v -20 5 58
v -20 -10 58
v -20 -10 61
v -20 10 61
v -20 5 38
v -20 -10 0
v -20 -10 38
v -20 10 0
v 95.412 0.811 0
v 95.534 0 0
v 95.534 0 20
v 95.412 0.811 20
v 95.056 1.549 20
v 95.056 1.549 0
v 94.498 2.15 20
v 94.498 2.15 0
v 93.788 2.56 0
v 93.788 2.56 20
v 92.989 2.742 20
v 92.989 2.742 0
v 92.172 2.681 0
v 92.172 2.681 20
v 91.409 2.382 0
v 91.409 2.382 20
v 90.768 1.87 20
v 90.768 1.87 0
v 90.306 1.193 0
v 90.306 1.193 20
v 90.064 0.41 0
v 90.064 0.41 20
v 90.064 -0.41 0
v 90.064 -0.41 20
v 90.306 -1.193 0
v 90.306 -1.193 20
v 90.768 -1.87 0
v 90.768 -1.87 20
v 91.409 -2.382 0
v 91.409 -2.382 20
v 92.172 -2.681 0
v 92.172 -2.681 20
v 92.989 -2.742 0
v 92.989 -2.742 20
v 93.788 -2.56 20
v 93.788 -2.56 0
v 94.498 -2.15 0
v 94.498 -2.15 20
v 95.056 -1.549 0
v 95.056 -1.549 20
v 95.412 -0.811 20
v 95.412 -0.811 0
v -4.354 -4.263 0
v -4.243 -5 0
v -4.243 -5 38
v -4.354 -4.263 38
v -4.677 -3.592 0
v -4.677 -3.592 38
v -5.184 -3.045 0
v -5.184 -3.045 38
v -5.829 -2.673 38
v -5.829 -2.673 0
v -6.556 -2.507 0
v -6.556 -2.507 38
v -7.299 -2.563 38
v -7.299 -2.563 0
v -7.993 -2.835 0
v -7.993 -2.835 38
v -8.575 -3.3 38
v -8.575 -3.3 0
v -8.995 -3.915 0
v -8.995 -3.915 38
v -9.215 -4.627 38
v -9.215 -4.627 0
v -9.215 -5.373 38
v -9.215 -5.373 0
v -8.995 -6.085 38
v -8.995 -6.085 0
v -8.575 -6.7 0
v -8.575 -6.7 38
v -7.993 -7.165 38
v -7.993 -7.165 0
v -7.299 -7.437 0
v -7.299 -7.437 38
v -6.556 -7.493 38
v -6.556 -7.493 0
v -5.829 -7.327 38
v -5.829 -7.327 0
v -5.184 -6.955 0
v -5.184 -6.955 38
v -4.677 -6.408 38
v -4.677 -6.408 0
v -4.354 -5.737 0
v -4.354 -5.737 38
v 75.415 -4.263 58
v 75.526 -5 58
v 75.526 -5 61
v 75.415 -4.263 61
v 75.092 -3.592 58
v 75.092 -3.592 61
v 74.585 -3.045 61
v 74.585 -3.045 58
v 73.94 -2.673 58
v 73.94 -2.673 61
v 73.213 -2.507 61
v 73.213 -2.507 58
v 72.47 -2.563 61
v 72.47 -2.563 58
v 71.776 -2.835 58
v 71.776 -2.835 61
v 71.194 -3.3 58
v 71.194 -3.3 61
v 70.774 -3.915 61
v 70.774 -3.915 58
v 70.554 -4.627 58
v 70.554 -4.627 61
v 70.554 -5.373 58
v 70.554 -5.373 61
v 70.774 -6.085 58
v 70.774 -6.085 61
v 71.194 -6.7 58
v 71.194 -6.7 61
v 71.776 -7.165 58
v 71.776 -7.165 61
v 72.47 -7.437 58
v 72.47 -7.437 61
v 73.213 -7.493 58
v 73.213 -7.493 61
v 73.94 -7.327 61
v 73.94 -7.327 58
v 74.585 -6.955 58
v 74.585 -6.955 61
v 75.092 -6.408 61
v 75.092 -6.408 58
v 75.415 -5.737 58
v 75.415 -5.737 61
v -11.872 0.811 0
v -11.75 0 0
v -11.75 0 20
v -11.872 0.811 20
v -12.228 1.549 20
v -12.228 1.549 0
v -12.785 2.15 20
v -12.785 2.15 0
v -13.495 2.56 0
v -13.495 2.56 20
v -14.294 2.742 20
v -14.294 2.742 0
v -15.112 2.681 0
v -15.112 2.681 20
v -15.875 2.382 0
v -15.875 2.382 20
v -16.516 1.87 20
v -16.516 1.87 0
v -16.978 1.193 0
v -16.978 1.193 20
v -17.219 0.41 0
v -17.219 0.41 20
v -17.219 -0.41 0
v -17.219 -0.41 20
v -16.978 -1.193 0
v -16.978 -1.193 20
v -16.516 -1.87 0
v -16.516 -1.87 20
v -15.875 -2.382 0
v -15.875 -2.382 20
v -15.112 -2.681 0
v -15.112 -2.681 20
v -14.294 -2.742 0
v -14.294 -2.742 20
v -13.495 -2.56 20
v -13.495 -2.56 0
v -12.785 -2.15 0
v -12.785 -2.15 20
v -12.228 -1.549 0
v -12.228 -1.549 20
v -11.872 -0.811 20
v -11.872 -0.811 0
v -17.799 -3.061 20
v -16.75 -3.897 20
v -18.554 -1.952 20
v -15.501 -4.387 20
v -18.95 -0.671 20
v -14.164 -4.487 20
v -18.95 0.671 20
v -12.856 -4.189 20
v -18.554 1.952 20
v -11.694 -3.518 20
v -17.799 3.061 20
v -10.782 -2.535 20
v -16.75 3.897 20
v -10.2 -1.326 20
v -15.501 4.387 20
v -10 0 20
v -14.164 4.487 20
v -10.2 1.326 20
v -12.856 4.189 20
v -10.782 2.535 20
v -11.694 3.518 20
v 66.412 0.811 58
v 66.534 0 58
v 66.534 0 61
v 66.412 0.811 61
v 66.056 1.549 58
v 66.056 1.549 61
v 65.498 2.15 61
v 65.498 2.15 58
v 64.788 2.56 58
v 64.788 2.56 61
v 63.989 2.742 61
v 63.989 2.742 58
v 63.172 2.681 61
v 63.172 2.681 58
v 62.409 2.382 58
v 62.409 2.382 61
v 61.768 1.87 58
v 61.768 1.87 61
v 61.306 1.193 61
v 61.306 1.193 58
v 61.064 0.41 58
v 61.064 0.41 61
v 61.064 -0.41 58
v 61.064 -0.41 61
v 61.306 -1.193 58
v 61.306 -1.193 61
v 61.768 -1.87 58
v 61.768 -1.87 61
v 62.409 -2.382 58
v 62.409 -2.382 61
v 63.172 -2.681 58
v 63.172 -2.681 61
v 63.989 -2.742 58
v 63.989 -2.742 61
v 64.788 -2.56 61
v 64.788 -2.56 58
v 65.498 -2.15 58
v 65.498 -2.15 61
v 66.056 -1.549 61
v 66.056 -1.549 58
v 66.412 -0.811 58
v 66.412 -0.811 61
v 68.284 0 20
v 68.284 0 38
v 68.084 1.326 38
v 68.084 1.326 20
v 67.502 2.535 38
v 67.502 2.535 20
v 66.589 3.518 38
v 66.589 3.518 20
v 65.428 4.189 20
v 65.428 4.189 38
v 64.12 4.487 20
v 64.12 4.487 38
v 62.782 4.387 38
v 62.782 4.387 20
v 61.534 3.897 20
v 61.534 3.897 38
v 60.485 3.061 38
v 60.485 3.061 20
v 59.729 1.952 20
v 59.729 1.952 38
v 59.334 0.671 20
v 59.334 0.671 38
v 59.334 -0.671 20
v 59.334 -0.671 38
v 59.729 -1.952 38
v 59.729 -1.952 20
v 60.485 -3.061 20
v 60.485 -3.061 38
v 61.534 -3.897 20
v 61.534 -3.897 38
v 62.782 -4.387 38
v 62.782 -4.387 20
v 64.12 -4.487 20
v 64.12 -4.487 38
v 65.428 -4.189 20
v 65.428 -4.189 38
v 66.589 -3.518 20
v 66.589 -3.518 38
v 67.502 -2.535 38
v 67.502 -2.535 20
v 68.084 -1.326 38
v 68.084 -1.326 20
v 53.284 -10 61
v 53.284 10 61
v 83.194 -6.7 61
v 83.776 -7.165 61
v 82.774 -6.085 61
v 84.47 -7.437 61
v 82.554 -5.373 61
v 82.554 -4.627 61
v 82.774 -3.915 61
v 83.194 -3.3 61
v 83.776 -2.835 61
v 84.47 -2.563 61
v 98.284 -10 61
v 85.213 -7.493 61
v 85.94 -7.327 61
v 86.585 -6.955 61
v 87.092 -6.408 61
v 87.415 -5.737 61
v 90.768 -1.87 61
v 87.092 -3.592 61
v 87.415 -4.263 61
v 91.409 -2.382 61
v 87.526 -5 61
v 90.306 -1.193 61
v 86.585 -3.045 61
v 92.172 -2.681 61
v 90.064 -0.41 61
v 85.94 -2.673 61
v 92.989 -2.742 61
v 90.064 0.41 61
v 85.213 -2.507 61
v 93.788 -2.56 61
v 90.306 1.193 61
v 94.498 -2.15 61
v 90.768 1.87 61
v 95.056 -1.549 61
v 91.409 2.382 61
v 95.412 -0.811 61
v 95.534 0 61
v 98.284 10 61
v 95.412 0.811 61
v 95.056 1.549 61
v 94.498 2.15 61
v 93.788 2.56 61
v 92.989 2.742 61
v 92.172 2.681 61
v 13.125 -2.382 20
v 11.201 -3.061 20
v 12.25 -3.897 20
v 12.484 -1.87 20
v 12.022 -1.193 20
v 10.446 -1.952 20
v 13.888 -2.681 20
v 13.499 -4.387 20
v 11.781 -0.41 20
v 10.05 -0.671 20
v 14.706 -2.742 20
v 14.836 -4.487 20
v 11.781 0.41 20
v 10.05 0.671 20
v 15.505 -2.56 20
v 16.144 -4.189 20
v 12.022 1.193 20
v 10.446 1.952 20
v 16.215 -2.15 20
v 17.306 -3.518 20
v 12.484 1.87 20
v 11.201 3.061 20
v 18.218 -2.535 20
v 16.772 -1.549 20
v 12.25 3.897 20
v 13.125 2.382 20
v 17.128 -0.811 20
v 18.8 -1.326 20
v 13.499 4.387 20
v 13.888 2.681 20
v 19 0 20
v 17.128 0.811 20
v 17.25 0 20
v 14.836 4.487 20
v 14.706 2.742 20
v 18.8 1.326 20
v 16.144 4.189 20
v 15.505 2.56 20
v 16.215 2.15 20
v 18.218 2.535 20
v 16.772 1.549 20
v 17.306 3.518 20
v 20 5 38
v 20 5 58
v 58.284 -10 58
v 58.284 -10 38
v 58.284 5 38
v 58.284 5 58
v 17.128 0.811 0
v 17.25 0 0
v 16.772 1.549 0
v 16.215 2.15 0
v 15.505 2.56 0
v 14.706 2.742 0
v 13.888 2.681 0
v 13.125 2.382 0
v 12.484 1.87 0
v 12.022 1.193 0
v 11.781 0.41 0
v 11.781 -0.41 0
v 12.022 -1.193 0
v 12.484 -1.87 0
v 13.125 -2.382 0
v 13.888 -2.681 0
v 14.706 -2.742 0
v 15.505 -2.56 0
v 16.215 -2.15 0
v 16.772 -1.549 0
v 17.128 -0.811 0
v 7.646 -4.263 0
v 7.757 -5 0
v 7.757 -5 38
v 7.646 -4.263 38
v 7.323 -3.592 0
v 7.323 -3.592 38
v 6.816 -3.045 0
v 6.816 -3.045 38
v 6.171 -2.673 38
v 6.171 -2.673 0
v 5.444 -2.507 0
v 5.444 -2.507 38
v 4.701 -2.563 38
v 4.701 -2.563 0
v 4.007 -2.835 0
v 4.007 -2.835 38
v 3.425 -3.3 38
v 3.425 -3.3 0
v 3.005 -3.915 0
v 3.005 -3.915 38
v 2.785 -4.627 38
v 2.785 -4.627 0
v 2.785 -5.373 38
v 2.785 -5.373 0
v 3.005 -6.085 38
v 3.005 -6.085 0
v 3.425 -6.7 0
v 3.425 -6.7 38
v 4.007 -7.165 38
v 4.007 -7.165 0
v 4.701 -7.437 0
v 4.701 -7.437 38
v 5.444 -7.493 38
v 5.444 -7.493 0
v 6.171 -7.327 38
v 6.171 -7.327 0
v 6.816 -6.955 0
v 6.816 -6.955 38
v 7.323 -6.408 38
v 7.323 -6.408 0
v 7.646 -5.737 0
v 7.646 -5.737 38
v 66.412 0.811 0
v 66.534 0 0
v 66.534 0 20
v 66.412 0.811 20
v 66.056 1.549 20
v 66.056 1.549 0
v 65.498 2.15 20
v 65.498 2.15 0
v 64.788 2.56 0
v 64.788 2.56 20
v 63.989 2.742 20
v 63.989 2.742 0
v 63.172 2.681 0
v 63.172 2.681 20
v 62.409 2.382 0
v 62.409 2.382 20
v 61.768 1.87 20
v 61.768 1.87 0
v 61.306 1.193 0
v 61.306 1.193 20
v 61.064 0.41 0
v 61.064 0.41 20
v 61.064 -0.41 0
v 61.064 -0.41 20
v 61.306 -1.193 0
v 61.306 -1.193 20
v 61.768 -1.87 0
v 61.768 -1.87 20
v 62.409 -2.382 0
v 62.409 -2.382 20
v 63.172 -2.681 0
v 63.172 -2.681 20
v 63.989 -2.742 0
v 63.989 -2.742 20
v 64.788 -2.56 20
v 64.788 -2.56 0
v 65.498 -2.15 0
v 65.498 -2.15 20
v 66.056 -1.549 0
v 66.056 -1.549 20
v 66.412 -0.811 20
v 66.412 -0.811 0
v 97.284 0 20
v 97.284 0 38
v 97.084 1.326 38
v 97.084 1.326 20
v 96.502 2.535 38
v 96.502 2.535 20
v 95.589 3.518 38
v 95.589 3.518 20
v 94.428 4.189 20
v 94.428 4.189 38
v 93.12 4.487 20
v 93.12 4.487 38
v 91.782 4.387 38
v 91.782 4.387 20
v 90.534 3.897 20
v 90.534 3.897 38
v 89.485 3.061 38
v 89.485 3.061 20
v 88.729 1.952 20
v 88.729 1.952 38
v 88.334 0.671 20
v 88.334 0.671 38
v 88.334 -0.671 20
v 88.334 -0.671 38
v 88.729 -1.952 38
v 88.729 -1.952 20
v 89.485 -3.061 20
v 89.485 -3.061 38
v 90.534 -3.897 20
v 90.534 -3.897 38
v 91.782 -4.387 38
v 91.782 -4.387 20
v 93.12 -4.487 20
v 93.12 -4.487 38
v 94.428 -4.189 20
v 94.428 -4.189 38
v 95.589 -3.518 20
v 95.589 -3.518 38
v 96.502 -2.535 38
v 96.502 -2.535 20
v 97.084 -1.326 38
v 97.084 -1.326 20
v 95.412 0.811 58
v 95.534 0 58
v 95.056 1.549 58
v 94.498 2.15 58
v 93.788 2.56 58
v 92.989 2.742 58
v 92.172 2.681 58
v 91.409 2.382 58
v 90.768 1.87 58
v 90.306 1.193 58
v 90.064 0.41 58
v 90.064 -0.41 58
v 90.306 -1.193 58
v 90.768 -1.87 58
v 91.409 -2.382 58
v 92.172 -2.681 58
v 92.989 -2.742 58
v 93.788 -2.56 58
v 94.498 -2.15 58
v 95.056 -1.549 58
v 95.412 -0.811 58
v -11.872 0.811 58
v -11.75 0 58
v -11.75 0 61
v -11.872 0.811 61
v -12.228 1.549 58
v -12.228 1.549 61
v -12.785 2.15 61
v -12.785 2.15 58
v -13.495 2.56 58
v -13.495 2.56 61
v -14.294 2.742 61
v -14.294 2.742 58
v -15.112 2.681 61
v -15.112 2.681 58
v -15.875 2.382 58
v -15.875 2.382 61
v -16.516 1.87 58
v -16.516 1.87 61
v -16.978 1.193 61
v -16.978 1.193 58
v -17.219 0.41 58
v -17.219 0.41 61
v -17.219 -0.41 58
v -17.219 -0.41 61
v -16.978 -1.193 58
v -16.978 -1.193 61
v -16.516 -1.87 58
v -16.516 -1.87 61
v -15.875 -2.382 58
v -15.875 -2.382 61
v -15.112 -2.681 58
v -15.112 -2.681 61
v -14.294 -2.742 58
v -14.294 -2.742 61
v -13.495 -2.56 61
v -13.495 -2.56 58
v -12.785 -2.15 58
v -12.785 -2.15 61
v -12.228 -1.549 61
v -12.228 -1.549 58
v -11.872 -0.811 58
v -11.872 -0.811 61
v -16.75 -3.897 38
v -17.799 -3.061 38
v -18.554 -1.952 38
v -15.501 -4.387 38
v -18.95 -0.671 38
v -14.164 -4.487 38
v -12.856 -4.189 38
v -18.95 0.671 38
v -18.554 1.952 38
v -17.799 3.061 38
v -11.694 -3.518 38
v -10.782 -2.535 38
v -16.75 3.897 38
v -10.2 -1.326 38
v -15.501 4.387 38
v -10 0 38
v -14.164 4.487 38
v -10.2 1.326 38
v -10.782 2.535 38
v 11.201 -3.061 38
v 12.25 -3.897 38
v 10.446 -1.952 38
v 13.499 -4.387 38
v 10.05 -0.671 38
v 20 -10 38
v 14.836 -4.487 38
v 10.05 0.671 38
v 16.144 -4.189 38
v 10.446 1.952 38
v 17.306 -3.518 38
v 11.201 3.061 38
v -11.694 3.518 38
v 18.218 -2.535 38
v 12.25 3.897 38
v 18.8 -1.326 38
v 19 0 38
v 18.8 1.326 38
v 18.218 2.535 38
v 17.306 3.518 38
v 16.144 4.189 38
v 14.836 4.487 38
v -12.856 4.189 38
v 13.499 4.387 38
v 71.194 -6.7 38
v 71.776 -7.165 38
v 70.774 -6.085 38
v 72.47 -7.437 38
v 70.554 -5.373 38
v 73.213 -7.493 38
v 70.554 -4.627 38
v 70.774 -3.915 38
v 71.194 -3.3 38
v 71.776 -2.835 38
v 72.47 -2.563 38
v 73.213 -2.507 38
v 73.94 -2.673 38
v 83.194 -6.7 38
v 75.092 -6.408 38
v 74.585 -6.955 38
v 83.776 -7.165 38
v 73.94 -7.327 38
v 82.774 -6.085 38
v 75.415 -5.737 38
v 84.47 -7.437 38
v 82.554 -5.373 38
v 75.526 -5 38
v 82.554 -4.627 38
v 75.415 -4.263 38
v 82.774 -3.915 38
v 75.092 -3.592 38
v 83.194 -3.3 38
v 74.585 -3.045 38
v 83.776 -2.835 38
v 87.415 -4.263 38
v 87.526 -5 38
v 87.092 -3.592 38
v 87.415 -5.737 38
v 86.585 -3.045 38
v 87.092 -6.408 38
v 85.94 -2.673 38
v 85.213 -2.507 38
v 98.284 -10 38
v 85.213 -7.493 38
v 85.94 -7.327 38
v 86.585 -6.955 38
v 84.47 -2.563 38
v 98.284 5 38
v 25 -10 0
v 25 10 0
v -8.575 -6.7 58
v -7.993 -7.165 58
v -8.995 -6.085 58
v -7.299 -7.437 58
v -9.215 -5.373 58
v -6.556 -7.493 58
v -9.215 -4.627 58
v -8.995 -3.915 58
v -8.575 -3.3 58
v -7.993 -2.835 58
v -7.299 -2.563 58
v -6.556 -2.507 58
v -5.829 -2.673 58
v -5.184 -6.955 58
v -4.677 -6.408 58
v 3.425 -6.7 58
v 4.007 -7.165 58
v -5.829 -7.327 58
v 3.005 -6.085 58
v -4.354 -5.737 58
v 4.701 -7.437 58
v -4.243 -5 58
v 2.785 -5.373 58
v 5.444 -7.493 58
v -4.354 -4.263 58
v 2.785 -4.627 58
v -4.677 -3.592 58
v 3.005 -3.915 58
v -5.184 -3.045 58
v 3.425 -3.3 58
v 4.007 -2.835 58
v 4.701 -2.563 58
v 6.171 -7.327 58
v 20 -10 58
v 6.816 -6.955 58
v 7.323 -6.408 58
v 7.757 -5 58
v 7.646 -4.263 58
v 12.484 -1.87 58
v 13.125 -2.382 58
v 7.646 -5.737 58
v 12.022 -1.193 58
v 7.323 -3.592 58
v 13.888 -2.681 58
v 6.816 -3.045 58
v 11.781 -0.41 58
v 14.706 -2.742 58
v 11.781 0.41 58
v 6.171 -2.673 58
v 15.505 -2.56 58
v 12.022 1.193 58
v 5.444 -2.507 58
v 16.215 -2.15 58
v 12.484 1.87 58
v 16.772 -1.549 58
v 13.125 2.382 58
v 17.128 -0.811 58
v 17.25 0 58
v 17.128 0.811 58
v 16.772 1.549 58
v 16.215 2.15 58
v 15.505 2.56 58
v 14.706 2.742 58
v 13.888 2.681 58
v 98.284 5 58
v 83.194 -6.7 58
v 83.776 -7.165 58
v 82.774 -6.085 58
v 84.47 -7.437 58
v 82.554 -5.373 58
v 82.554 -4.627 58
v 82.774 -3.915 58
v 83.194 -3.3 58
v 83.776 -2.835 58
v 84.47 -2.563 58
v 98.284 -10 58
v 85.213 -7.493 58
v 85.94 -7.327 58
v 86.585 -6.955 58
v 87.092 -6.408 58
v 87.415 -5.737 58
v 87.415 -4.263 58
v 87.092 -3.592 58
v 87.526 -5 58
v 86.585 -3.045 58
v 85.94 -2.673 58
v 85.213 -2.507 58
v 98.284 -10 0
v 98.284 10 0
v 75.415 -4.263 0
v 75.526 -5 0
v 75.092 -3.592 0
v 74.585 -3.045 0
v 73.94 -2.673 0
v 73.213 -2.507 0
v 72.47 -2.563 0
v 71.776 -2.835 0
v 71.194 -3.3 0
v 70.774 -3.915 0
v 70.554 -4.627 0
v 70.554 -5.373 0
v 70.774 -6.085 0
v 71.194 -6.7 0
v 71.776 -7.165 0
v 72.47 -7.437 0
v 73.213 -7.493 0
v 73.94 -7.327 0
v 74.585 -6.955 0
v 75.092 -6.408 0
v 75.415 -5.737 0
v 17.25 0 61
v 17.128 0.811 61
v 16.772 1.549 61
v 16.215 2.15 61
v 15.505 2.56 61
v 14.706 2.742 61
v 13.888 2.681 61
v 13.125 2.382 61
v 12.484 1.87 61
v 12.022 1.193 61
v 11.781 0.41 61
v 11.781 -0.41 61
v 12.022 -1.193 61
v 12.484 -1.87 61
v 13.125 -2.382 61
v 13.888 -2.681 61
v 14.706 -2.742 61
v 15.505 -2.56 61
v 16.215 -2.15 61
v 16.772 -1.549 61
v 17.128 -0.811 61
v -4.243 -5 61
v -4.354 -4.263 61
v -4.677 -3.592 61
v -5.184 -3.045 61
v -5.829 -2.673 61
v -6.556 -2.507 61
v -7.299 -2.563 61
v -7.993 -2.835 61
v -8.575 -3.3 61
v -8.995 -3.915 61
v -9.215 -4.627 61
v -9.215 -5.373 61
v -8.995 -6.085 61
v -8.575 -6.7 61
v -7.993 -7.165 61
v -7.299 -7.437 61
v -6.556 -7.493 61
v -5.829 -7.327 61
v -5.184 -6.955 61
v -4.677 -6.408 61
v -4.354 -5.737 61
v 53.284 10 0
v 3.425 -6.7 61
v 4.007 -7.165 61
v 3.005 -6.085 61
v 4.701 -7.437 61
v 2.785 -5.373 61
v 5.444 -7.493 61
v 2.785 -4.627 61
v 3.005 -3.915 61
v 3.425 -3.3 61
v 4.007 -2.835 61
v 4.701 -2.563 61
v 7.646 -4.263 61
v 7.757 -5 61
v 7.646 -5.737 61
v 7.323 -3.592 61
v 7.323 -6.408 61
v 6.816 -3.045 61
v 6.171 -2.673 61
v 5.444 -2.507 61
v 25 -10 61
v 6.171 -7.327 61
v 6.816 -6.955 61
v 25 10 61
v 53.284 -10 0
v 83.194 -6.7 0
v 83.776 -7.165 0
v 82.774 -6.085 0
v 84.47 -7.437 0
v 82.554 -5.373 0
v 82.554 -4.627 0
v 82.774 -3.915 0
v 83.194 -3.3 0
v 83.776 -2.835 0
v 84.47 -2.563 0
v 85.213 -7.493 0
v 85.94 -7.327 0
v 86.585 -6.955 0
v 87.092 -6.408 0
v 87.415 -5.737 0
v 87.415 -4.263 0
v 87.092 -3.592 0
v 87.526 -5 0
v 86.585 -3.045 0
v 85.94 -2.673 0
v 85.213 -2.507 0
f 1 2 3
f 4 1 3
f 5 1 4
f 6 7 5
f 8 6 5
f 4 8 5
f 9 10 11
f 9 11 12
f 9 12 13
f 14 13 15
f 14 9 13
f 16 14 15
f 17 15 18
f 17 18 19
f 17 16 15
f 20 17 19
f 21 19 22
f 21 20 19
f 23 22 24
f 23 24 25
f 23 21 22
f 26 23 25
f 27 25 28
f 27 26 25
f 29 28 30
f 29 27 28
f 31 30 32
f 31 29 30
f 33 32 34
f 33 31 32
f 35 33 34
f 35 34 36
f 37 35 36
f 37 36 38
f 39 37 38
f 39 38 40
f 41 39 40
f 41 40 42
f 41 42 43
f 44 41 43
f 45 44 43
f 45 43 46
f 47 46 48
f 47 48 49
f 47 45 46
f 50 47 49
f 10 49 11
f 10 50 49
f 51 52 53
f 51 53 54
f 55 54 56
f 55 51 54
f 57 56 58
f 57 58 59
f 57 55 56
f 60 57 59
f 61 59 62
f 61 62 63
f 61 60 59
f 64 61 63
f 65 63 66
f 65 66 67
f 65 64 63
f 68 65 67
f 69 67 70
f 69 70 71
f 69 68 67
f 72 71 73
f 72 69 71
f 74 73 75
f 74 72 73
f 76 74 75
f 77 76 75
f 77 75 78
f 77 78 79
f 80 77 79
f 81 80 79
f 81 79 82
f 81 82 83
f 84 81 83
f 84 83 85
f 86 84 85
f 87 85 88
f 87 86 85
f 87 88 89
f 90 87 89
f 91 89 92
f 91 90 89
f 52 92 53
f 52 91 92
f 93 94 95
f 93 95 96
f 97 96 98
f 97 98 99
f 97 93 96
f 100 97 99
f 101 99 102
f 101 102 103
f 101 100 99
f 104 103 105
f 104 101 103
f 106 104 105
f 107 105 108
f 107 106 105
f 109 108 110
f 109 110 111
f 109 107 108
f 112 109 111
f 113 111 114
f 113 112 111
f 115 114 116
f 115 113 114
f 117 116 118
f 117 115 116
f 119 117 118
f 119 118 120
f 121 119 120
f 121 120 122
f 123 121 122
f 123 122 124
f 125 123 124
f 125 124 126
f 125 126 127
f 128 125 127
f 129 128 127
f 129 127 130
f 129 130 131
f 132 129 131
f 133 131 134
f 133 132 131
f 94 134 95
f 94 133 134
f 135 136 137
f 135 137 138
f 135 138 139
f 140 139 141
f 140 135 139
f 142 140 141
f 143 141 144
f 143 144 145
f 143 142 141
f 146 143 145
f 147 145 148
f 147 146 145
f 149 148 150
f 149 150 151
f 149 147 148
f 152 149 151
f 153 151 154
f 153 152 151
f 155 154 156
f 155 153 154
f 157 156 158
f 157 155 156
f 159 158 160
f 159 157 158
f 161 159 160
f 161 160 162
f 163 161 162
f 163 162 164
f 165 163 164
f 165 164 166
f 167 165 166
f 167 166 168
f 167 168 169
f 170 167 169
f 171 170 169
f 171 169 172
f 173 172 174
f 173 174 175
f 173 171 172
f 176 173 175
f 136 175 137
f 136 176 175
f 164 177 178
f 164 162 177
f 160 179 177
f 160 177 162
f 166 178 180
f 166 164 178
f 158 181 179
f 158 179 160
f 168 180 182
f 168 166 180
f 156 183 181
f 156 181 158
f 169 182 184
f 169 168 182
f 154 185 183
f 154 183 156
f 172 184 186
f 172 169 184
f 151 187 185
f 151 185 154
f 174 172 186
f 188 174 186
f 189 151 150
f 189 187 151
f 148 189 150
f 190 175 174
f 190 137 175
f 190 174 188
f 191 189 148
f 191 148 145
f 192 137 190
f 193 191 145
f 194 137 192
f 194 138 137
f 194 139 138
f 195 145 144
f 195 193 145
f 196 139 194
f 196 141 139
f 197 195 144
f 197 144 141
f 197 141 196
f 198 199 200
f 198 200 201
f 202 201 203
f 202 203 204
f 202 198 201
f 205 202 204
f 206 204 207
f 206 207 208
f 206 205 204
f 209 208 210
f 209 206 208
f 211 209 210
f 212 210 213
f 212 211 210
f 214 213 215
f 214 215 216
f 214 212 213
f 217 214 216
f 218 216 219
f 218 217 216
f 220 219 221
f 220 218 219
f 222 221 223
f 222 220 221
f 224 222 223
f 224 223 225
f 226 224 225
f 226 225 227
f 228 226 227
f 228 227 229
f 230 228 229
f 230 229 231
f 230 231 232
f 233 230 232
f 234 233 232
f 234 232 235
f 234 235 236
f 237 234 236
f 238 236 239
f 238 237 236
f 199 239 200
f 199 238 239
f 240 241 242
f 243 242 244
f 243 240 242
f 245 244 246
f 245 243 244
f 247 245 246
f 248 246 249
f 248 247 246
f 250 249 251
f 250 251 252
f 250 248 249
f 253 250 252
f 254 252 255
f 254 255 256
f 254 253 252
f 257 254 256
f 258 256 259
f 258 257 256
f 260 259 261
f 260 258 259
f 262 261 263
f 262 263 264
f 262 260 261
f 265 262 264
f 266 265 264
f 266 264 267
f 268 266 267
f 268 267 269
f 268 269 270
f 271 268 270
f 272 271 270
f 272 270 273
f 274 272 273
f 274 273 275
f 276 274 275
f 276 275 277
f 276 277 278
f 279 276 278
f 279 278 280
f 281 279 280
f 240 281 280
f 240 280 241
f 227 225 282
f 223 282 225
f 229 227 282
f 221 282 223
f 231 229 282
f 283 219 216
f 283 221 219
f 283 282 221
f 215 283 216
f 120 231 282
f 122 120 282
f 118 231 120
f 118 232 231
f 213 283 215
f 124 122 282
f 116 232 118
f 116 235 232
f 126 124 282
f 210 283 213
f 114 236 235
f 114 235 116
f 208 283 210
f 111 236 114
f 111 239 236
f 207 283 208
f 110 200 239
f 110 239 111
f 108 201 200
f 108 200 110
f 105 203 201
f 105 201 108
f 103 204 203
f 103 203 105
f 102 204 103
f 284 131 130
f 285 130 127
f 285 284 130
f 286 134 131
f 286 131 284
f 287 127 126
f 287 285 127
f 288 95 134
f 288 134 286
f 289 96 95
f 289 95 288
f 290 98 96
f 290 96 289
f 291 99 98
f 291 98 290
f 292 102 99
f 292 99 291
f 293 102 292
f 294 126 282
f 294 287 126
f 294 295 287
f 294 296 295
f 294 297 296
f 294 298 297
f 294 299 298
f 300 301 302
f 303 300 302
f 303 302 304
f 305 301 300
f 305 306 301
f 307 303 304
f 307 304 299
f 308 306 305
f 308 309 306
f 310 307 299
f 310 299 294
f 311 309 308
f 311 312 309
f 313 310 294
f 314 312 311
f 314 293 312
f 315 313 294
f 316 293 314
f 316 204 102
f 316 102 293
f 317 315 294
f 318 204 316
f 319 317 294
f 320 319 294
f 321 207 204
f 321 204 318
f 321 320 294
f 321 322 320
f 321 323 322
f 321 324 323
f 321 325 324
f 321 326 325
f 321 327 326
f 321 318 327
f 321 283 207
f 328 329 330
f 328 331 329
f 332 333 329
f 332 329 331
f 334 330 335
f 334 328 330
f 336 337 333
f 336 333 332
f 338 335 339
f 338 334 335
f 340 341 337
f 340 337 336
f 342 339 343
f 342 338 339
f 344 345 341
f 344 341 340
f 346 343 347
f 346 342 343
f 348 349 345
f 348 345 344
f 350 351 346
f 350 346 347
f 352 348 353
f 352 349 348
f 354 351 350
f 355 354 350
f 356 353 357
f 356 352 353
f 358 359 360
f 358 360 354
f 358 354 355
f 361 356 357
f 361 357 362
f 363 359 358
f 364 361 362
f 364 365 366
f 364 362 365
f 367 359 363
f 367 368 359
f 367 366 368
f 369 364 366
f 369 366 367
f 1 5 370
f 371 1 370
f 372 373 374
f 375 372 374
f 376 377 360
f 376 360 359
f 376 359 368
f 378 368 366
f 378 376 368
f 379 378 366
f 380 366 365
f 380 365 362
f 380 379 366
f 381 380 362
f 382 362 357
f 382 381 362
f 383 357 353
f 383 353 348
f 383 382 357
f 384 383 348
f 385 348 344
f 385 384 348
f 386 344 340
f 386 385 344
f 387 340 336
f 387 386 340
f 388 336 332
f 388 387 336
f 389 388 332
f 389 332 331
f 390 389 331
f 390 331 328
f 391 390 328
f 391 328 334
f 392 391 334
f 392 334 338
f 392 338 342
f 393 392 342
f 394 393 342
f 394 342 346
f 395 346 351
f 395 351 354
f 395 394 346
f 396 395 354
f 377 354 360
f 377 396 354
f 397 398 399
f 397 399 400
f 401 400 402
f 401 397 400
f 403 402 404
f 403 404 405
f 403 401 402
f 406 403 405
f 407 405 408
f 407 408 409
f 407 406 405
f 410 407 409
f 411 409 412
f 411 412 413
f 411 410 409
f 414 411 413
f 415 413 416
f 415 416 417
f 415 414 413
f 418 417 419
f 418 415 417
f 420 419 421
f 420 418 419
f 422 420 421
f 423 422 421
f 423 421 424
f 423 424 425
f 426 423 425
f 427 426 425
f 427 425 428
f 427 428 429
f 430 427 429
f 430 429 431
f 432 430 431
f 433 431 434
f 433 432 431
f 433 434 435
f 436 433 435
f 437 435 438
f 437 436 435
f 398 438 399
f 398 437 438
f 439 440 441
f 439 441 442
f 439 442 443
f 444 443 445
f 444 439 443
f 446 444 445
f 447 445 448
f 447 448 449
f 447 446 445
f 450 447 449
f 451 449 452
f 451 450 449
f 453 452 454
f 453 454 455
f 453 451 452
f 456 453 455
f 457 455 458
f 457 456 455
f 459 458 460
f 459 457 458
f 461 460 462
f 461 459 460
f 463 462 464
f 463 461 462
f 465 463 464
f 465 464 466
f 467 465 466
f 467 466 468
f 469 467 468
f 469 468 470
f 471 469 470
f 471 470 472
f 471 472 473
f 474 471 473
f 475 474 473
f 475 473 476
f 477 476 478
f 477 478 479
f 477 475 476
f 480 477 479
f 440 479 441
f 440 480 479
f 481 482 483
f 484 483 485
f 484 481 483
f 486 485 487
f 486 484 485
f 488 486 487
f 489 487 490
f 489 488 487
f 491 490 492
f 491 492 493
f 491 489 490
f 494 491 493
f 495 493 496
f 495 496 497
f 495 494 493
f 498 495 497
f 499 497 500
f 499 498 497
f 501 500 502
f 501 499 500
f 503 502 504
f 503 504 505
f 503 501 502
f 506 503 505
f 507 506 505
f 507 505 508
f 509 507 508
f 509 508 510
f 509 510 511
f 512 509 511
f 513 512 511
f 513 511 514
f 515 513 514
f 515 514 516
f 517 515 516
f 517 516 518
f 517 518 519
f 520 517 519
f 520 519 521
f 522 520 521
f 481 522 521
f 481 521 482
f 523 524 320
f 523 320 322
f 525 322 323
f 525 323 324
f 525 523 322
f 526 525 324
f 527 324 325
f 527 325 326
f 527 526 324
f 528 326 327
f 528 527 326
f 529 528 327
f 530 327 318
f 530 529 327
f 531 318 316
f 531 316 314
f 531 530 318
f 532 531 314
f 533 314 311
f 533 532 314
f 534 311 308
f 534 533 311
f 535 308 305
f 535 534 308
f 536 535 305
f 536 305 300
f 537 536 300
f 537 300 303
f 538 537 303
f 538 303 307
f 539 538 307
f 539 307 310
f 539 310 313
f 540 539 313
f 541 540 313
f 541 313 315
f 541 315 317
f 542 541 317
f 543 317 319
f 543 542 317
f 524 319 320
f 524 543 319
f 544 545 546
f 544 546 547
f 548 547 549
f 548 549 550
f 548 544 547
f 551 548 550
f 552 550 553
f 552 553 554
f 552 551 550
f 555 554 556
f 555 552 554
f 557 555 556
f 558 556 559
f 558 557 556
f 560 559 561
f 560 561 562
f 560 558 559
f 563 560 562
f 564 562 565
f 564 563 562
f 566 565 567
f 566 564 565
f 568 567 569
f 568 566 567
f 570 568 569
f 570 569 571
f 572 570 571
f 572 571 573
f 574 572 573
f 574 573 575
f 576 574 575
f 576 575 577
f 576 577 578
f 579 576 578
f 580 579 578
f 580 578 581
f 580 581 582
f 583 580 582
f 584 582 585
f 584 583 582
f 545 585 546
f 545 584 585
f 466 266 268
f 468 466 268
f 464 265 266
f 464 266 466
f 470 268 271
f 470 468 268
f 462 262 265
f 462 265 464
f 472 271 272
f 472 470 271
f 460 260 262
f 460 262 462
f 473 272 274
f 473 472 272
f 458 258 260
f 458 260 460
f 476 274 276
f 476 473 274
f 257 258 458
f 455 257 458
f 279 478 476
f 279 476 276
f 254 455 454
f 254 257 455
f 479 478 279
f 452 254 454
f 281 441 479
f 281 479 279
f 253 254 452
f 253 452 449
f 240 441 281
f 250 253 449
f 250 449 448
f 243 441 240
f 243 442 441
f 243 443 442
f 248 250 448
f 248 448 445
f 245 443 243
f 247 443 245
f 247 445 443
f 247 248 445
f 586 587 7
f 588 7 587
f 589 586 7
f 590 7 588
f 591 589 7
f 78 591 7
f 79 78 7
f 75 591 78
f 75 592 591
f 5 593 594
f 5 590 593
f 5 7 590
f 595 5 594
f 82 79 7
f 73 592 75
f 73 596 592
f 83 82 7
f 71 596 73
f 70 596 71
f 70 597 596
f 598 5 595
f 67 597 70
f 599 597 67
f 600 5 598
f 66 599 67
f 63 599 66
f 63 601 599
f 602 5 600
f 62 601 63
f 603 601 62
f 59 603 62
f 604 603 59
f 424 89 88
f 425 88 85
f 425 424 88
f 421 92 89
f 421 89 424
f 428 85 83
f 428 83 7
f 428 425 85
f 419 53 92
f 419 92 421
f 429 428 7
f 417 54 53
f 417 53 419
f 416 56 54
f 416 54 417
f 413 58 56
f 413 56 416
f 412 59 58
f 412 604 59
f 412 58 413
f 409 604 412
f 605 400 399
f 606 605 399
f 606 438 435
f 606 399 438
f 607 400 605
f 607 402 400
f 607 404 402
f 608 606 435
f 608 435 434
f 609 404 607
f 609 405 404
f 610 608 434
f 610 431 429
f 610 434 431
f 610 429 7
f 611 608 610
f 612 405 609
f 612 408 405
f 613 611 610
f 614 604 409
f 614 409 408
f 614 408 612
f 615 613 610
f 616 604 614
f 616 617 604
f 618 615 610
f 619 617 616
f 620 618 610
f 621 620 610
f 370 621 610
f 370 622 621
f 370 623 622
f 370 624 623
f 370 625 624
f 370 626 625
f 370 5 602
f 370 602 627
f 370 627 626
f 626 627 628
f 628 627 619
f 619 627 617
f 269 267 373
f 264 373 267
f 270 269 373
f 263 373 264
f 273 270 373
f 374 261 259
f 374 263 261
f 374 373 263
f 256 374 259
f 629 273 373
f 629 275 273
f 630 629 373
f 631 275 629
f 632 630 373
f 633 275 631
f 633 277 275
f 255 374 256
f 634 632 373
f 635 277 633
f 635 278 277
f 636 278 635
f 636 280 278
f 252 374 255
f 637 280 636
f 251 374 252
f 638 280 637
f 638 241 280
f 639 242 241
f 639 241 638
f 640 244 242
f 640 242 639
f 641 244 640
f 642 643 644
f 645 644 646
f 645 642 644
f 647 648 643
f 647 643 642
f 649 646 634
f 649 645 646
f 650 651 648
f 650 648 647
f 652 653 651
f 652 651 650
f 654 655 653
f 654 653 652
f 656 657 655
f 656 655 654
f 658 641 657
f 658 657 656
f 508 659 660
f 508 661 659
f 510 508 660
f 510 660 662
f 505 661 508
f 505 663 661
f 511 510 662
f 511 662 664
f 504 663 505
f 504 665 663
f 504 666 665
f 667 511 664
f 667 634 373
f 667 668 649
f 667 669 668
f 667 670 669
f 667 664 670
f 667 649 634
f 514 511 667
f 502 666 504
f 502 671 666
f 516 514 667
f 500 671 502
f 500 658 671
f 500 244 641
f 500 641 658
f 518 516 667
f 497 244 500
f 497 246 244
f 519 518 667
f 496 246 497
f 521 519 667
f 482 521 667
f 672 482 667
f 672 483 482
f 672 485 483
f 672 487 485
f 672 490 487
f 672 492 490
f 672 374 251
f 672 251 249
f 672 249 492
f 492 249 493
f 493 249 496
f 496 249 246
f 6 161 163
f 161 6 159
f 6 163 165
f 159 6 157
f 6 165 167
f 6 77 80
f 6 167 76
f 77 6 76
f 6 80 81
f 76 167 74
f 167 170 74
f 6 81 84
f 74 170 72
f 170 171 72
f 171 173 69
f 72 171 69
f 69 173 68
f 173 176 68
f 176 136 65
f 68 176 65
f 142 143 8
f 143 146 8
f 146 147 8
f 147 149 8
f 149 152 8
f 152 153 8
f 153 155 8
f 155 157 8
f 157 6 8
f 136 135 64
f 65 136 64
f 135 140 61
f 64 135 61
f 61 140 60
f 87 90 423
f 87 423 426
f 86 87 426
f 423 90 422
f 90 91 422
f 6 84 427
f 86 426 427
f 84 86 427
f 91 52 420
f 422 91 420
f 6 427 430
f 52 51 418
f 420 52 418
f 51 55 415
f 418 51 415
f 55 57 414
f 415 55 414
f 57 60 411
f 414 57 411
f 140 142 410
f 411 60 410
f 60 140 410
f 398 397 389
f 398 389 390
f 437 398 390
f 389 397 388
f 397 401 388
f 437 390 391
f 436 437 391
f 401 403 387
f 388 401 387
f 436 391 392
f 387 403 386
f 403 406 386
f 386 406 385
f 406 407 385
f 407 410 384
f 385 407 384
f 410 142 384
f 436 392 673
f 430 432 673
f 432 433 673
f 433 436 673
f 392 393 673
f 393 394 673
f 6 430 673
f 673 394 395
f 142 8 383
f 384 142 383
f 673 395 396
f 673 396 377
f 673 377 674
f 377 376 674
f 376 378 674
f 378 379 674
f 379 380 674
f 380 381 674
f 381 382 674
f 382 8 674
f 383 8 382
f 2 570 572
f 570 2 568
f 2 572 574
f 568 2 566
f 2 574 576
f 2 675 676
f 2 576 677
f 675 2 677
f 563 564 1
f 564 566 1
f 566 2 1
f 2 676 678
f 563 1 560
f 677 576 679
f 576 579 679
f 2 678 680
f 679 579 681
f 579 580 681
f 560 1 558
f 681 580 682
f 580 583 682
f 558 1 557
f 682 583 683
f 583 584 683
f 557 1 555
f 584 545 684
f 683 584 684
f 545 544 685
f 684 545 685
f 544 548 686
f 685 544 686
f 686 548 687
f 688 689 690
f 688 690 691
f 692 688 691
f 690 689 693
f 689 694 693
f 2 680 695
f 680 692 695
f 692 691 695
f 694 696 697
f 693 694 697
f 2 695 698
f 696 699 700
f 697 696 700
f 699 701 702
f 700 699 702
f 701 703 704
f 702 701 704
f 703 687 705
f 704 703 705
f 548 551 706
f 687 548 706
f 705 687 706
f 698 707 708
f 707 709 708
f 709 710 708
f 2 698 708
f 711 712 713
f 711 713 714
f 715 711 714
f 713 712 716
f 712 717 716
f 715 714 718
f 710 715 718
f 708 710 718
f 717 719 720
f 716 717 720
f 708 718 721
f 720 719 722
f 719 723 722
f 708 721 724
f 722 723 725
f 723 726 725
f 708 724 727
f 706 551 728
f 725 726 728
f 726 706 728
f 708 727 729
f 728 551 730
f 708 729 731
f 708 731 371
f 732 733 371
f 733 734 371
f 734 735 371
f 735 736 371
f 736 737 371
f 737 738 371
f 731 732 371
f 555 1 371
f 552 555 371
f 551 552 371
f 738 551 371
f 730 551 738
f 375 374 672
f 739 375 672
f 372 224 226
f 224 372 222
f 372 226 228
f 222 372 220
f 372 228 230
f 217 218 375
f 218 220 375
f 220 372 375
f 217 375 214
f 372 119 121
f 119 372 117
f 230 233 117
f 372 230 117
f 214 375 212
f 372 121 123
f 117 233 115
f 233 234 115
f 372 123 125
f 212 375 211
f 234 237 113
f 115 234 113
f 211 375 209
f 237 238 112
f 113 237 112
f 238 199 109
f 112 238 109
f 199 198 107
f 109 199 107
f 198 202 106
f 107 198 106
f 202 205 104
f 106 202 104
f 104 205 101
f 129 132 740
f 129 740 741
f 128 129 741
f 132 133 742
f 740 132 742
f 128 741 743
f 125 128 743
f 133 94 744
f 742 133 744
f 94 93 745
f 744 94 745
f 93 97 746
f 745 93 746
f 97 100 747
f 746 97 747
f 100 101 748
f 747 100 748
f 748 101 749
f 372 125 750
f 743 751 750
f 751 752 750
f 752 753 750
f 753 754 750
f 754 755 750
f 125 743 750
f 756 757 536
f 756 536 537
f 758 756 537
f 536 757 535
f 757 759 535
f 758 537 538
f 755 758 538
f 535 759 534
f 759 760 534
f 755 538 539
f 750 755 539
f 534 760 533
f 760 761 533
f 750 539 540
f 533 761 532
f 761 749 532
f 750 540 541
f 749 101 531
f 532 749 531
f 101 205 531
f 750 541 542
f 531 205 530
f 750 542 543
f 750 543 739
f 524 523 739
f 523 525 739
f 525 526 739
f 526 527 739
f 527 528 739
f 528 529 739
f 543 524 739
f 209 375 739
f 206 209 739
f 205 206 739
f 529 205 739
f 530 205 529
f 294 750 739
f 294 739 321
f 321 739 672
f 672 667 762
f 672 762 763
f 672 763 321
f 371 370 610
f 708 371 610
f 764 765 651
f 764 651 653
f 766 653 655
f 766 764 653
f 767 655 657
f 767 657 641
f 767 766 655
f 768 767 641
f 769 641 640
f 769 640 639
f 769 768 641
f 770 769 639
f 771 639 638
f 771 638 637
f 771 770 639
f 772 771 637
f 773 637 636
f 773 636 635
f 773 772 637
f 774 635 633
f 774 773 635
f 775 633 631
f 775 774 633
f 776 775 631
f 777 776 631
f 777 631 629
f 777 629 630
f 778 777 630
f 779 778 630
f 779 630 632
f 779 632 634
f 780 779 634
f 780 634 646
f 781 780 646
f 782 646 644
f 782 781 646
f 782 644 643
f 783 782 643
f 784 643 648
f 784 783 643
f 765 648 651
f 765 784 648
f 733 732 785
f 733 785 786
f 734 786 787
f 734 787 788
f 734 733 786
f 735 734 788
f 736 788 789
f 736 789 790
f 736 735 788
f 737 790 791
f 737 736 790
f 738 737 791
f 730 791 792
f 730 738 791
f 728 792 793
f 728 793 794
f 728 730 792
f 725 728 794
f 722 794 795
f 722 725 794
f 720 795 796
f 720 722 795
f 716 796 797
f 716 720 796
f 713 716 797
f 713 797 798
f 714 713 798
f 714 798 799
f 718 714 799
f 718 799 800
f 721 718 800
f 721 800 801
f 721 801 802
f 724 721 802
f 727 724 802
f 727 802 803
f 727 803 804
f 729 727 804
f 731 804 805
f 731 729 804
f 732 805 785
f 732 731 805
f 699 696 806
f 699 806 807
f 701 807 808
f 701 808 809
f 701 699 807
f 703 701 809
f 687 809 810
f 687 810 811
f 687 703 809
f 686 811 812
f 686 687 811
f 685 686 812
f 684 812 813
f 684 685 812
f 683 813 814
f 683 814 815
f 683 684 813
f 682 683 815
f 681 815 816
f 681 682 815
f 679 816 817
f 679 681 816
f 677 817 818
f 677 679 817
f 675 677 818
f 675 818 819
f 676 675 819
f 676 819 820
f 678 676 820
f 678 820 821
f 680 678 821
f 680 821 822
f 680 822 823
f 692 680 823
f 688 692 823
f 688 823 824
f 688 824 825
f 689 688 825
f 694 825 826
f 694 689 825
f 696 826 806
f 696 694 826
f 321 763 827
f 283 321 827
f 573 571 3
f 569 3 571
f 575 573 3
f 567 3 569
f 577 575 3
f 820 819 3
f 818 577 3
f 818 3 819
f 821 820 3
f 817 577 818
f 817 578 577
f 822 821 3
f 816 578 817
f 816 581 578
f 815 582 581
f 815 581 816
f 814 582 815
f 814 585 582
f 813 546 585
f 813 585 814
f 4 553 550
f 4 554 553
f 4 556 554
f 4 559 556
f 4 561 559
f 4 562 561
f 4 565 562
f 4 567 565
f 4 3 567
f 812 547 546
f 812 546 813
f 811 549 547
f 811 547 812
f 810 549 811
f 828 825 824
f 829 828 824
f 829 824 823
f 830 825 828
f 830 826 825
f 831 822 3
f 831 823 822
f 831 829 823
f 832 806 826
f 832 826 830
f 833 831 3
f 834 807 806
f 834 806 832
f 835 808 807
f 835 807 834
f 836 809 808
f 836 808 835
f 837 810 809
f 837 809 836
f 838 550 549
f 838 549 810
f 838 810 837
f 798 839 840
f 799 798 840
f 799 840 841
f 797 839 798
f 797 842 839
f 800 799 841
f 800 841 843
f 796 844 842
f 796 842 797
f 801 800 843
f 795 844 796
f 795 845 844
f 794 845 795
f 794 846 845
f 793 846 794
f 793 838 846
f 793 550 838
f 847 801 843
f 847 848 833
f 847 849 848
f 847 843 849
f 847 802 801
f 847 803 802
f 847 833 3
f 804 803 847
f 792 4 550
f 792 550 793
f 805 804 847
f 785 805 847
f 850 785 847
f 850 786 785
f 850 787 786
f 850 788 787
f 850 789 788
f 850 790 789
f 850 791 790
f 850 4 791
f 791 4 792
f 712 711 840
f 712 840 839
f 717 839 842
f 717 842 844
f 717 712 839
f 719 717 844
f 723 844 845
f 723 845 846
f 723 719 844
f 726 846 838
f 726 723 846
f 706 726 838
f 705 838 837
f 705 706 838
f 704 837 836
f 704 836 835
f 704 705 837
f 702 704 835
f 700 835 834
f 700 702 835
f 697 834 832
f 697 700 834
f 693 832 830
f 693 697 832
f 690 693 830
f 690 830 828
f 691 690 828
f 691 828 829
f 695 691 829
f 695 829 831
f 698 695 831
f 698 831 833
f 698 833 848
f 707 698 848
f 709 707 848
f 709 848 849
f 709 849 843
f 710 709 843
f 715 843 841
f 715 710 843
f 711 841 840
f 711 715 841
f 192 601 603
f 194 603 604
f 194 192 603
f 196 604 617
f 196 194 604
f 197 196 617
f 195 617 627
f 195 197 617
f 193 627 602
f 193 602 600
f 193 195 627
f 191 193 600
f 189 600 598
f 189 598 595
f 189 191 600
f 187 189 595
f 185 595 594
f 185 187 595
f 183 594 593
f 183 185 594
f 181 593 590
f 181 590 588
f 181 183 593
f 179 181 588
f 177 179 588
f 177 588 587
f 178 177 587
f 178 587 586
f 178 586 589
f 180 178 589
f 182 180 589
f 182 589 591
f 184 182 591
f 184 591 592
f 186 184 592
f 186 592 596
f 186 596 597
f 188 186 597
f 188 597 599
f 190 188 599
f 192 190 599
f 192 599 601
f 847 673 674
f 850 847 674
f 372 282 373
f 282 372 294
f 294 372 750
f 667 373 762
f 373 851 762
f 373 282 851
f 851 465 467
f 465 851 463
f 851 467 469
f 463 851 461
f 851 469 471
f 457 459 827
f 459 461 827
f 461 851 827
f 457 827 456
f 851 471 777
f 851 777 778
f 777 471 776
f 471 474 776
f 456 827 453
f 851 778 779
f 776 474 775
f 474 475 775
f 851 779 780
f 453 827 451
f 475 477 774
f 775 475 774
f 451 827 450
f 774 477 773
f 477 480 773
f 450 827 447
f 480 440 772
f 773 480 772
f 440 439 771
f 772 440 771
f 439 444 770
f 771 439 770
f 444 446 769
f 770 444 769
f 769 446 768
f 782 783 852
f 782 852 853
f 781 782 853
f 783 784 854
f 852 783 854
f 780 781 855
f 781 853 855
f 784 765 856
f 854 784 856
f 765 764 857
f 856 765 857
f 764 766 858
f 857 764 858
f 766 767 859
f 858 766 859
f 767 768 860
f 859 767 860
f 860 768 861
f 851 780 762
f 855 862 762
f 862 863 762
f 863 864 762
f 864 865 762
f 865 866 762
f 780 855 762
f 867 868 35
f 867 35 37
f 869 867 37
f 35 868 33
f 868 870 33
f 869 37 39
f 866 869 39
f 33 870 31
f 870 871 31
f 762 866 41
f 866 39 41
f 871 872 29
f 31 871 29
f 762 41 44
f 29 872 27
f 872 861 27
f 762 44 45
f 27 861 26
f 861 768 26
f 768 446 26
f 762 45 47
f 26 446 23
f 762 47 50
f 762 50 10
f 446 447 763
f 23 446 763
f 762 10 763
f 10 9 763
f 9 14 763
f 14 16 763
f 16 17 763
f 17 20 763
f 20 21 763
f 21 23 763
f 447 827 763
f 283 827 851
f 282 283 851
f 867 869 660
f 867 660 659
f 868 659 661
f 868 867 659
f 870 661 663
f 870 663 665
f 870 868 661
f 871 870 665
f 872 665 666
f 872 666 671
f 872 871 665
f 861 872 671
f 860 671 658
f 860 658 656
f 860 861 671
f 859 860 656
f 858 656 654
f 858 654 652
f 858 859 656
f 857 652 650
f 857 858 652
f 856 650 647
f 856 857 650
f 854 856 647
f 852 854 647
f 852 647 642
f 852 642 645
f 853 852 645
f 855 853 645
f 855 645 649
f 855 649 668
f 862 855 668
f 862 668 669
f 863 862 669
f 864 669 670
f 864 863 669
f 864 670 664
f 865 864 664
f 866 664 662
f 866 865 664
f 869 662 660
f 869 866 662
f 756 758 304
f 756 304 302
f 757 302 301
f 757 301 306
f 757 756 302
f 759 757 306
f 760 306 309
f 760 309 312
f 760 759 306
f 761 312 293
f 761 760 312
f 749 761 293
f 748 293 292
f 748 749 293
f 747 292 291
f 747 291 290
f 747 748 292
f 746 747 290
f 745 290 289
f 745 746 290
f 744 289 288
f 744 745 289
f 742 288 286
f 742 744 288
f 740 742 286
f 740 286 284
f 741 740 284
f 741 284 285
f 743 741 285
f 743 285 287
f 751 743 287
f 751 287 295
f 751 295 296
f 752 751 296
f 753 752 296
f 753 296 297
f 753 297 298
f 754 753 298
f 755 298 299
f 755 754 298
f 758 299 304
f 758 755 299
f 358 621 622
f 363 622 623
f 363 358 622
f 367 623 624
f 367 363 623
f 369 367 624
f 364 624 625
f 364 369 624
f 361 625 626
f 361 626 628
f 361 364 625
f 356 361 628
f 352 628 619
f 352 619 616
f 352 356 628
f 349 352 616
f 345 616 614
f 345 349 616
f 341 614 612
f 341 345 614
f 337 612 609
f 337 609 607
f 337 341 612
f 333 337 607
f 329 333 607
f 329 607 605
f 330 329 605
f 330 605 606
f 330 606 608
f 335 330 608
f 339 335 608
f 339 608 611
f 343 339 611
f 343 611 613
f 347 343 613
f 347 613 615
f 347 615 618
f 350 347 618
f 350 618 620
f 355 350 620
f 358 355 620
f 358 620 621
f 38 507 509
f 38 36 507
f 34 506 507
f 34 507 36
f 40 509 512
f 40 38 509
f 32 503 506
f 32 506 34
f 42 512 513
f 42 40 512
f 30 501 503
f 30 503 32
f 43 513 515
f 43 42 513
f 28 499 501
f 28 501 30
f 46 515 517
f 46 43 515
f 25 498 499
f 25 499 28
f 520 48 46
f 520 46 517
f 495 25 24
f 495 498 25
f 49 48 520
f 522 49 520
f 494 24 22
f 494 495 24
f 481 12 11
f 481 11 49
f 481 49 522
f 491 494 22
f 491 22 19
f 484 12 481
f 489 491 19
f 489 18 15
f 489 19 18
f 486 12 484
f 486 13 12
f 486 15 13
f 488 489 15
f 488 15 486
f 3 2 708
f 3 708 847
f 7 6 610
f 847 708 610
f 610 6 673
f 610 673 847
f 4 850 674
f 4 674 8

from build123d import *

# Parameters (mm, degrees)
F0_W     = 40
F0_H     = 15
F0_R     = 2.5
F0_R_2   = 4.5
F1_DEPTH = 38
F0_H_2   = 5
F2_DEPTH = 61
F3_START = 58
F3_DEPTH = 3
F0_R_3   = 2.75
F4_DEPTH = 20
F5_START = 58
F5_DEPTH = 3


with BuildPart() as f1:
    # F0 (on Top) → F1 (new body)
    with BuildSketch(Plane.XY):
        with Locations((0, -2.5)):
            Rectangle(F0_W, F0_H)
        with Locations((-6.7427190952, -5)):
            Circle(F0_R, mode=Mode.SUBTRACT)
        with Locations((5.2572809048, -5)):
            Circle(F0_R, mode=Mode.SUBTRACT)
        with Locations((-14.5, 0)):
            Circle(F0_R_2, mode=Mode.SUBTRACT)
        with Locations((14.5, 0)):
            Circle(F0_R_2, mode=Mode.SUBTRACT)
    extrude(amount=F1_DEPTH)

    # F0 (on Top) → F2 (join)
    with BuildSketch(Plane.XY):
        Polygon((25, 10), (20, 10), (20, 5), (20, -10), (25, -10), align=None)
        with Locations((0, 7.5)):
            Rectangle(F0_W, F0_H_2)
    extrude(amount=F2_DEPTH)

    # F0 (on Top) → F3 (join)
    with BuildSketch(Plane.XY.offset(F3_START)):
        with Locations((0, -2.5)):
            Rectangle(F0_W, F0_H)
        with Locations((-6.7427190952, -5)):
            Circle(F0_R, mode=Mode.SUBTRACT)
        with Locations((5.2572809048, -5)):
            Circle(F0_R, mode=Mode.SUBTRACT)
        with Locations((-14.5, 0)):
            Circle(F0_R_2, mode=Mode.SUBTRACT)
        with Locations((14.5, 0)):
            Circle(F0_R_2, mode=Mode.SUBTRACT)
    extrude(amount=F3_DEPTH)

    # F0 (on Top) → F4 (join)
    with BuildSketch(Plane.XY):
        with Locations((-14.5, 0)):
            Circle(F0_R_2)
        with Locations((-14.5, 0)):
            Circle(F0_R_3, mode=Mode.SUBTRACT)
        with Locations((14.5, 0)):
            Circle(F0_R_2)
        with Locations((14.5, 0)):
            Circle(F0_R_3, mode=Mode.SUBTRACT)
    extrude(amount=F4_DEPTH)

    # F0 (on Top) → F5 (join)
    with BuildSketch(Plane.XY.offset(F5_START)):
        with Locations((-14.5, 0)):
            Circle(F0_R_2)
        with Locations((-14.5, 0)):
            Circle(F0_R_3, mode=Mode.SUBTRACT)
        with Locations((14.5, 0)):
            Circle(F0_R_2)
        with Locations((14.5, 0)):
            Circle(F0_R_3, mode=Mode.SUBTRACT)
    extrude(amount=F5_DEPTH)


with BuildPart() as f1b:
    # F0 (on Top) → F1, piece 2 (new body)
    with BuildSketch(Plane.XY):
        with Locations((78.2836824656, -2.5)):
            Rectangle(F0_W, F0_H)
        with Locations((73.0264015608, -5)):
            Circle(F0_R, mode=Mode.SUBTRACT)
        with Locations((85.0264015608, -5)):
            Circle(F0_R, mode=Mode.SUBTRACT)
        with Locations((63.7836824656, 0)):
            Circle(F0_R_2, mode=Mode.SUBTRACT)
        with Locations((92.7836824656, 0)):
            Circle(F0_R_2, mode=Mode.SUBTRACT)
    extrude(amount=F1_DEPTH)

    # F0 (on Top) → F2, piece 2 (join)
    with BuildSketch(Plane.XY):
        Polygon((58.2836824656, 5), (58.2836824656, 10), (53.2836824656, 10), (53.2836824656, -10), (58.2836824656, -10), align=None)
        with Locations((78.2836824656, 7.5)):
            Rectangle(F0_W, F0_H_2)
    extrude(amount=F2_DEPTH)

    # F0 (on Top) → F3, piece 2 (join)
    with BuildSketch(Plane.XY.offset(F3_START)):
        with Locations((78.2836824656, -2.5)):
            Rectangle(F0_W, F0_H)
        with Locations((73.0264015608, -5)):
            Circle(F0_R, mode=Mode.SUBTRACT)
        with Locations((85.0264015608, -5)):
            Circle(F0_R, mode=Mode.SUBTRACT)
        with Locations((63.7836824656, 0)):
            Circle(F0_R_2, mode=Mode.SUBTRACT)
        with Locations((92.7836824656, 0)):
            Circle(F0_R_2, mode=Mode.SUBTRACT)
    extrude(amount=F3_DEPTH)

    # F0 (on Top) → F4, piece 2 (join)
    with BuildSketch(Plane.XY):
        with Locations((63.7836824656, 0)):
            Circle(F0_R_2)
        with Locations((63.7836824656, 0)):
            Circle(F0_R_3, mode=Mode.SUBTRACT)
        with Locations((92.7836824656, 0)):
            Circle(F0_R_2)
        with Locations((92.7836824656, 0)):
            Circle(F0_R_3, mode=Mode.SUBTRACT)
    extrude(amount=F4_DEPTH)

    # F0 (on Top) → F5, piece 2 (join)
    with BuildSketch(Plane.XY.offset(F5_START)):
        with Locations((63.7836824656, 0)):
            Circle(F0_R_2)
        with Locations((63.7836824656, 0)):
            Circle(F0_R_3, mode=Mode.SUBTRACT)
        with Locations((92.7836824656, 0)):
            Circle(F0_R_2)
        with Locations((92.7836824656, 0)):
            Circle(F0_R_3, mode=Mode.SUBTRACT)
    extrude(amount=F5_DEPTH)


solid = Compound([f1.part, f1b.part])
